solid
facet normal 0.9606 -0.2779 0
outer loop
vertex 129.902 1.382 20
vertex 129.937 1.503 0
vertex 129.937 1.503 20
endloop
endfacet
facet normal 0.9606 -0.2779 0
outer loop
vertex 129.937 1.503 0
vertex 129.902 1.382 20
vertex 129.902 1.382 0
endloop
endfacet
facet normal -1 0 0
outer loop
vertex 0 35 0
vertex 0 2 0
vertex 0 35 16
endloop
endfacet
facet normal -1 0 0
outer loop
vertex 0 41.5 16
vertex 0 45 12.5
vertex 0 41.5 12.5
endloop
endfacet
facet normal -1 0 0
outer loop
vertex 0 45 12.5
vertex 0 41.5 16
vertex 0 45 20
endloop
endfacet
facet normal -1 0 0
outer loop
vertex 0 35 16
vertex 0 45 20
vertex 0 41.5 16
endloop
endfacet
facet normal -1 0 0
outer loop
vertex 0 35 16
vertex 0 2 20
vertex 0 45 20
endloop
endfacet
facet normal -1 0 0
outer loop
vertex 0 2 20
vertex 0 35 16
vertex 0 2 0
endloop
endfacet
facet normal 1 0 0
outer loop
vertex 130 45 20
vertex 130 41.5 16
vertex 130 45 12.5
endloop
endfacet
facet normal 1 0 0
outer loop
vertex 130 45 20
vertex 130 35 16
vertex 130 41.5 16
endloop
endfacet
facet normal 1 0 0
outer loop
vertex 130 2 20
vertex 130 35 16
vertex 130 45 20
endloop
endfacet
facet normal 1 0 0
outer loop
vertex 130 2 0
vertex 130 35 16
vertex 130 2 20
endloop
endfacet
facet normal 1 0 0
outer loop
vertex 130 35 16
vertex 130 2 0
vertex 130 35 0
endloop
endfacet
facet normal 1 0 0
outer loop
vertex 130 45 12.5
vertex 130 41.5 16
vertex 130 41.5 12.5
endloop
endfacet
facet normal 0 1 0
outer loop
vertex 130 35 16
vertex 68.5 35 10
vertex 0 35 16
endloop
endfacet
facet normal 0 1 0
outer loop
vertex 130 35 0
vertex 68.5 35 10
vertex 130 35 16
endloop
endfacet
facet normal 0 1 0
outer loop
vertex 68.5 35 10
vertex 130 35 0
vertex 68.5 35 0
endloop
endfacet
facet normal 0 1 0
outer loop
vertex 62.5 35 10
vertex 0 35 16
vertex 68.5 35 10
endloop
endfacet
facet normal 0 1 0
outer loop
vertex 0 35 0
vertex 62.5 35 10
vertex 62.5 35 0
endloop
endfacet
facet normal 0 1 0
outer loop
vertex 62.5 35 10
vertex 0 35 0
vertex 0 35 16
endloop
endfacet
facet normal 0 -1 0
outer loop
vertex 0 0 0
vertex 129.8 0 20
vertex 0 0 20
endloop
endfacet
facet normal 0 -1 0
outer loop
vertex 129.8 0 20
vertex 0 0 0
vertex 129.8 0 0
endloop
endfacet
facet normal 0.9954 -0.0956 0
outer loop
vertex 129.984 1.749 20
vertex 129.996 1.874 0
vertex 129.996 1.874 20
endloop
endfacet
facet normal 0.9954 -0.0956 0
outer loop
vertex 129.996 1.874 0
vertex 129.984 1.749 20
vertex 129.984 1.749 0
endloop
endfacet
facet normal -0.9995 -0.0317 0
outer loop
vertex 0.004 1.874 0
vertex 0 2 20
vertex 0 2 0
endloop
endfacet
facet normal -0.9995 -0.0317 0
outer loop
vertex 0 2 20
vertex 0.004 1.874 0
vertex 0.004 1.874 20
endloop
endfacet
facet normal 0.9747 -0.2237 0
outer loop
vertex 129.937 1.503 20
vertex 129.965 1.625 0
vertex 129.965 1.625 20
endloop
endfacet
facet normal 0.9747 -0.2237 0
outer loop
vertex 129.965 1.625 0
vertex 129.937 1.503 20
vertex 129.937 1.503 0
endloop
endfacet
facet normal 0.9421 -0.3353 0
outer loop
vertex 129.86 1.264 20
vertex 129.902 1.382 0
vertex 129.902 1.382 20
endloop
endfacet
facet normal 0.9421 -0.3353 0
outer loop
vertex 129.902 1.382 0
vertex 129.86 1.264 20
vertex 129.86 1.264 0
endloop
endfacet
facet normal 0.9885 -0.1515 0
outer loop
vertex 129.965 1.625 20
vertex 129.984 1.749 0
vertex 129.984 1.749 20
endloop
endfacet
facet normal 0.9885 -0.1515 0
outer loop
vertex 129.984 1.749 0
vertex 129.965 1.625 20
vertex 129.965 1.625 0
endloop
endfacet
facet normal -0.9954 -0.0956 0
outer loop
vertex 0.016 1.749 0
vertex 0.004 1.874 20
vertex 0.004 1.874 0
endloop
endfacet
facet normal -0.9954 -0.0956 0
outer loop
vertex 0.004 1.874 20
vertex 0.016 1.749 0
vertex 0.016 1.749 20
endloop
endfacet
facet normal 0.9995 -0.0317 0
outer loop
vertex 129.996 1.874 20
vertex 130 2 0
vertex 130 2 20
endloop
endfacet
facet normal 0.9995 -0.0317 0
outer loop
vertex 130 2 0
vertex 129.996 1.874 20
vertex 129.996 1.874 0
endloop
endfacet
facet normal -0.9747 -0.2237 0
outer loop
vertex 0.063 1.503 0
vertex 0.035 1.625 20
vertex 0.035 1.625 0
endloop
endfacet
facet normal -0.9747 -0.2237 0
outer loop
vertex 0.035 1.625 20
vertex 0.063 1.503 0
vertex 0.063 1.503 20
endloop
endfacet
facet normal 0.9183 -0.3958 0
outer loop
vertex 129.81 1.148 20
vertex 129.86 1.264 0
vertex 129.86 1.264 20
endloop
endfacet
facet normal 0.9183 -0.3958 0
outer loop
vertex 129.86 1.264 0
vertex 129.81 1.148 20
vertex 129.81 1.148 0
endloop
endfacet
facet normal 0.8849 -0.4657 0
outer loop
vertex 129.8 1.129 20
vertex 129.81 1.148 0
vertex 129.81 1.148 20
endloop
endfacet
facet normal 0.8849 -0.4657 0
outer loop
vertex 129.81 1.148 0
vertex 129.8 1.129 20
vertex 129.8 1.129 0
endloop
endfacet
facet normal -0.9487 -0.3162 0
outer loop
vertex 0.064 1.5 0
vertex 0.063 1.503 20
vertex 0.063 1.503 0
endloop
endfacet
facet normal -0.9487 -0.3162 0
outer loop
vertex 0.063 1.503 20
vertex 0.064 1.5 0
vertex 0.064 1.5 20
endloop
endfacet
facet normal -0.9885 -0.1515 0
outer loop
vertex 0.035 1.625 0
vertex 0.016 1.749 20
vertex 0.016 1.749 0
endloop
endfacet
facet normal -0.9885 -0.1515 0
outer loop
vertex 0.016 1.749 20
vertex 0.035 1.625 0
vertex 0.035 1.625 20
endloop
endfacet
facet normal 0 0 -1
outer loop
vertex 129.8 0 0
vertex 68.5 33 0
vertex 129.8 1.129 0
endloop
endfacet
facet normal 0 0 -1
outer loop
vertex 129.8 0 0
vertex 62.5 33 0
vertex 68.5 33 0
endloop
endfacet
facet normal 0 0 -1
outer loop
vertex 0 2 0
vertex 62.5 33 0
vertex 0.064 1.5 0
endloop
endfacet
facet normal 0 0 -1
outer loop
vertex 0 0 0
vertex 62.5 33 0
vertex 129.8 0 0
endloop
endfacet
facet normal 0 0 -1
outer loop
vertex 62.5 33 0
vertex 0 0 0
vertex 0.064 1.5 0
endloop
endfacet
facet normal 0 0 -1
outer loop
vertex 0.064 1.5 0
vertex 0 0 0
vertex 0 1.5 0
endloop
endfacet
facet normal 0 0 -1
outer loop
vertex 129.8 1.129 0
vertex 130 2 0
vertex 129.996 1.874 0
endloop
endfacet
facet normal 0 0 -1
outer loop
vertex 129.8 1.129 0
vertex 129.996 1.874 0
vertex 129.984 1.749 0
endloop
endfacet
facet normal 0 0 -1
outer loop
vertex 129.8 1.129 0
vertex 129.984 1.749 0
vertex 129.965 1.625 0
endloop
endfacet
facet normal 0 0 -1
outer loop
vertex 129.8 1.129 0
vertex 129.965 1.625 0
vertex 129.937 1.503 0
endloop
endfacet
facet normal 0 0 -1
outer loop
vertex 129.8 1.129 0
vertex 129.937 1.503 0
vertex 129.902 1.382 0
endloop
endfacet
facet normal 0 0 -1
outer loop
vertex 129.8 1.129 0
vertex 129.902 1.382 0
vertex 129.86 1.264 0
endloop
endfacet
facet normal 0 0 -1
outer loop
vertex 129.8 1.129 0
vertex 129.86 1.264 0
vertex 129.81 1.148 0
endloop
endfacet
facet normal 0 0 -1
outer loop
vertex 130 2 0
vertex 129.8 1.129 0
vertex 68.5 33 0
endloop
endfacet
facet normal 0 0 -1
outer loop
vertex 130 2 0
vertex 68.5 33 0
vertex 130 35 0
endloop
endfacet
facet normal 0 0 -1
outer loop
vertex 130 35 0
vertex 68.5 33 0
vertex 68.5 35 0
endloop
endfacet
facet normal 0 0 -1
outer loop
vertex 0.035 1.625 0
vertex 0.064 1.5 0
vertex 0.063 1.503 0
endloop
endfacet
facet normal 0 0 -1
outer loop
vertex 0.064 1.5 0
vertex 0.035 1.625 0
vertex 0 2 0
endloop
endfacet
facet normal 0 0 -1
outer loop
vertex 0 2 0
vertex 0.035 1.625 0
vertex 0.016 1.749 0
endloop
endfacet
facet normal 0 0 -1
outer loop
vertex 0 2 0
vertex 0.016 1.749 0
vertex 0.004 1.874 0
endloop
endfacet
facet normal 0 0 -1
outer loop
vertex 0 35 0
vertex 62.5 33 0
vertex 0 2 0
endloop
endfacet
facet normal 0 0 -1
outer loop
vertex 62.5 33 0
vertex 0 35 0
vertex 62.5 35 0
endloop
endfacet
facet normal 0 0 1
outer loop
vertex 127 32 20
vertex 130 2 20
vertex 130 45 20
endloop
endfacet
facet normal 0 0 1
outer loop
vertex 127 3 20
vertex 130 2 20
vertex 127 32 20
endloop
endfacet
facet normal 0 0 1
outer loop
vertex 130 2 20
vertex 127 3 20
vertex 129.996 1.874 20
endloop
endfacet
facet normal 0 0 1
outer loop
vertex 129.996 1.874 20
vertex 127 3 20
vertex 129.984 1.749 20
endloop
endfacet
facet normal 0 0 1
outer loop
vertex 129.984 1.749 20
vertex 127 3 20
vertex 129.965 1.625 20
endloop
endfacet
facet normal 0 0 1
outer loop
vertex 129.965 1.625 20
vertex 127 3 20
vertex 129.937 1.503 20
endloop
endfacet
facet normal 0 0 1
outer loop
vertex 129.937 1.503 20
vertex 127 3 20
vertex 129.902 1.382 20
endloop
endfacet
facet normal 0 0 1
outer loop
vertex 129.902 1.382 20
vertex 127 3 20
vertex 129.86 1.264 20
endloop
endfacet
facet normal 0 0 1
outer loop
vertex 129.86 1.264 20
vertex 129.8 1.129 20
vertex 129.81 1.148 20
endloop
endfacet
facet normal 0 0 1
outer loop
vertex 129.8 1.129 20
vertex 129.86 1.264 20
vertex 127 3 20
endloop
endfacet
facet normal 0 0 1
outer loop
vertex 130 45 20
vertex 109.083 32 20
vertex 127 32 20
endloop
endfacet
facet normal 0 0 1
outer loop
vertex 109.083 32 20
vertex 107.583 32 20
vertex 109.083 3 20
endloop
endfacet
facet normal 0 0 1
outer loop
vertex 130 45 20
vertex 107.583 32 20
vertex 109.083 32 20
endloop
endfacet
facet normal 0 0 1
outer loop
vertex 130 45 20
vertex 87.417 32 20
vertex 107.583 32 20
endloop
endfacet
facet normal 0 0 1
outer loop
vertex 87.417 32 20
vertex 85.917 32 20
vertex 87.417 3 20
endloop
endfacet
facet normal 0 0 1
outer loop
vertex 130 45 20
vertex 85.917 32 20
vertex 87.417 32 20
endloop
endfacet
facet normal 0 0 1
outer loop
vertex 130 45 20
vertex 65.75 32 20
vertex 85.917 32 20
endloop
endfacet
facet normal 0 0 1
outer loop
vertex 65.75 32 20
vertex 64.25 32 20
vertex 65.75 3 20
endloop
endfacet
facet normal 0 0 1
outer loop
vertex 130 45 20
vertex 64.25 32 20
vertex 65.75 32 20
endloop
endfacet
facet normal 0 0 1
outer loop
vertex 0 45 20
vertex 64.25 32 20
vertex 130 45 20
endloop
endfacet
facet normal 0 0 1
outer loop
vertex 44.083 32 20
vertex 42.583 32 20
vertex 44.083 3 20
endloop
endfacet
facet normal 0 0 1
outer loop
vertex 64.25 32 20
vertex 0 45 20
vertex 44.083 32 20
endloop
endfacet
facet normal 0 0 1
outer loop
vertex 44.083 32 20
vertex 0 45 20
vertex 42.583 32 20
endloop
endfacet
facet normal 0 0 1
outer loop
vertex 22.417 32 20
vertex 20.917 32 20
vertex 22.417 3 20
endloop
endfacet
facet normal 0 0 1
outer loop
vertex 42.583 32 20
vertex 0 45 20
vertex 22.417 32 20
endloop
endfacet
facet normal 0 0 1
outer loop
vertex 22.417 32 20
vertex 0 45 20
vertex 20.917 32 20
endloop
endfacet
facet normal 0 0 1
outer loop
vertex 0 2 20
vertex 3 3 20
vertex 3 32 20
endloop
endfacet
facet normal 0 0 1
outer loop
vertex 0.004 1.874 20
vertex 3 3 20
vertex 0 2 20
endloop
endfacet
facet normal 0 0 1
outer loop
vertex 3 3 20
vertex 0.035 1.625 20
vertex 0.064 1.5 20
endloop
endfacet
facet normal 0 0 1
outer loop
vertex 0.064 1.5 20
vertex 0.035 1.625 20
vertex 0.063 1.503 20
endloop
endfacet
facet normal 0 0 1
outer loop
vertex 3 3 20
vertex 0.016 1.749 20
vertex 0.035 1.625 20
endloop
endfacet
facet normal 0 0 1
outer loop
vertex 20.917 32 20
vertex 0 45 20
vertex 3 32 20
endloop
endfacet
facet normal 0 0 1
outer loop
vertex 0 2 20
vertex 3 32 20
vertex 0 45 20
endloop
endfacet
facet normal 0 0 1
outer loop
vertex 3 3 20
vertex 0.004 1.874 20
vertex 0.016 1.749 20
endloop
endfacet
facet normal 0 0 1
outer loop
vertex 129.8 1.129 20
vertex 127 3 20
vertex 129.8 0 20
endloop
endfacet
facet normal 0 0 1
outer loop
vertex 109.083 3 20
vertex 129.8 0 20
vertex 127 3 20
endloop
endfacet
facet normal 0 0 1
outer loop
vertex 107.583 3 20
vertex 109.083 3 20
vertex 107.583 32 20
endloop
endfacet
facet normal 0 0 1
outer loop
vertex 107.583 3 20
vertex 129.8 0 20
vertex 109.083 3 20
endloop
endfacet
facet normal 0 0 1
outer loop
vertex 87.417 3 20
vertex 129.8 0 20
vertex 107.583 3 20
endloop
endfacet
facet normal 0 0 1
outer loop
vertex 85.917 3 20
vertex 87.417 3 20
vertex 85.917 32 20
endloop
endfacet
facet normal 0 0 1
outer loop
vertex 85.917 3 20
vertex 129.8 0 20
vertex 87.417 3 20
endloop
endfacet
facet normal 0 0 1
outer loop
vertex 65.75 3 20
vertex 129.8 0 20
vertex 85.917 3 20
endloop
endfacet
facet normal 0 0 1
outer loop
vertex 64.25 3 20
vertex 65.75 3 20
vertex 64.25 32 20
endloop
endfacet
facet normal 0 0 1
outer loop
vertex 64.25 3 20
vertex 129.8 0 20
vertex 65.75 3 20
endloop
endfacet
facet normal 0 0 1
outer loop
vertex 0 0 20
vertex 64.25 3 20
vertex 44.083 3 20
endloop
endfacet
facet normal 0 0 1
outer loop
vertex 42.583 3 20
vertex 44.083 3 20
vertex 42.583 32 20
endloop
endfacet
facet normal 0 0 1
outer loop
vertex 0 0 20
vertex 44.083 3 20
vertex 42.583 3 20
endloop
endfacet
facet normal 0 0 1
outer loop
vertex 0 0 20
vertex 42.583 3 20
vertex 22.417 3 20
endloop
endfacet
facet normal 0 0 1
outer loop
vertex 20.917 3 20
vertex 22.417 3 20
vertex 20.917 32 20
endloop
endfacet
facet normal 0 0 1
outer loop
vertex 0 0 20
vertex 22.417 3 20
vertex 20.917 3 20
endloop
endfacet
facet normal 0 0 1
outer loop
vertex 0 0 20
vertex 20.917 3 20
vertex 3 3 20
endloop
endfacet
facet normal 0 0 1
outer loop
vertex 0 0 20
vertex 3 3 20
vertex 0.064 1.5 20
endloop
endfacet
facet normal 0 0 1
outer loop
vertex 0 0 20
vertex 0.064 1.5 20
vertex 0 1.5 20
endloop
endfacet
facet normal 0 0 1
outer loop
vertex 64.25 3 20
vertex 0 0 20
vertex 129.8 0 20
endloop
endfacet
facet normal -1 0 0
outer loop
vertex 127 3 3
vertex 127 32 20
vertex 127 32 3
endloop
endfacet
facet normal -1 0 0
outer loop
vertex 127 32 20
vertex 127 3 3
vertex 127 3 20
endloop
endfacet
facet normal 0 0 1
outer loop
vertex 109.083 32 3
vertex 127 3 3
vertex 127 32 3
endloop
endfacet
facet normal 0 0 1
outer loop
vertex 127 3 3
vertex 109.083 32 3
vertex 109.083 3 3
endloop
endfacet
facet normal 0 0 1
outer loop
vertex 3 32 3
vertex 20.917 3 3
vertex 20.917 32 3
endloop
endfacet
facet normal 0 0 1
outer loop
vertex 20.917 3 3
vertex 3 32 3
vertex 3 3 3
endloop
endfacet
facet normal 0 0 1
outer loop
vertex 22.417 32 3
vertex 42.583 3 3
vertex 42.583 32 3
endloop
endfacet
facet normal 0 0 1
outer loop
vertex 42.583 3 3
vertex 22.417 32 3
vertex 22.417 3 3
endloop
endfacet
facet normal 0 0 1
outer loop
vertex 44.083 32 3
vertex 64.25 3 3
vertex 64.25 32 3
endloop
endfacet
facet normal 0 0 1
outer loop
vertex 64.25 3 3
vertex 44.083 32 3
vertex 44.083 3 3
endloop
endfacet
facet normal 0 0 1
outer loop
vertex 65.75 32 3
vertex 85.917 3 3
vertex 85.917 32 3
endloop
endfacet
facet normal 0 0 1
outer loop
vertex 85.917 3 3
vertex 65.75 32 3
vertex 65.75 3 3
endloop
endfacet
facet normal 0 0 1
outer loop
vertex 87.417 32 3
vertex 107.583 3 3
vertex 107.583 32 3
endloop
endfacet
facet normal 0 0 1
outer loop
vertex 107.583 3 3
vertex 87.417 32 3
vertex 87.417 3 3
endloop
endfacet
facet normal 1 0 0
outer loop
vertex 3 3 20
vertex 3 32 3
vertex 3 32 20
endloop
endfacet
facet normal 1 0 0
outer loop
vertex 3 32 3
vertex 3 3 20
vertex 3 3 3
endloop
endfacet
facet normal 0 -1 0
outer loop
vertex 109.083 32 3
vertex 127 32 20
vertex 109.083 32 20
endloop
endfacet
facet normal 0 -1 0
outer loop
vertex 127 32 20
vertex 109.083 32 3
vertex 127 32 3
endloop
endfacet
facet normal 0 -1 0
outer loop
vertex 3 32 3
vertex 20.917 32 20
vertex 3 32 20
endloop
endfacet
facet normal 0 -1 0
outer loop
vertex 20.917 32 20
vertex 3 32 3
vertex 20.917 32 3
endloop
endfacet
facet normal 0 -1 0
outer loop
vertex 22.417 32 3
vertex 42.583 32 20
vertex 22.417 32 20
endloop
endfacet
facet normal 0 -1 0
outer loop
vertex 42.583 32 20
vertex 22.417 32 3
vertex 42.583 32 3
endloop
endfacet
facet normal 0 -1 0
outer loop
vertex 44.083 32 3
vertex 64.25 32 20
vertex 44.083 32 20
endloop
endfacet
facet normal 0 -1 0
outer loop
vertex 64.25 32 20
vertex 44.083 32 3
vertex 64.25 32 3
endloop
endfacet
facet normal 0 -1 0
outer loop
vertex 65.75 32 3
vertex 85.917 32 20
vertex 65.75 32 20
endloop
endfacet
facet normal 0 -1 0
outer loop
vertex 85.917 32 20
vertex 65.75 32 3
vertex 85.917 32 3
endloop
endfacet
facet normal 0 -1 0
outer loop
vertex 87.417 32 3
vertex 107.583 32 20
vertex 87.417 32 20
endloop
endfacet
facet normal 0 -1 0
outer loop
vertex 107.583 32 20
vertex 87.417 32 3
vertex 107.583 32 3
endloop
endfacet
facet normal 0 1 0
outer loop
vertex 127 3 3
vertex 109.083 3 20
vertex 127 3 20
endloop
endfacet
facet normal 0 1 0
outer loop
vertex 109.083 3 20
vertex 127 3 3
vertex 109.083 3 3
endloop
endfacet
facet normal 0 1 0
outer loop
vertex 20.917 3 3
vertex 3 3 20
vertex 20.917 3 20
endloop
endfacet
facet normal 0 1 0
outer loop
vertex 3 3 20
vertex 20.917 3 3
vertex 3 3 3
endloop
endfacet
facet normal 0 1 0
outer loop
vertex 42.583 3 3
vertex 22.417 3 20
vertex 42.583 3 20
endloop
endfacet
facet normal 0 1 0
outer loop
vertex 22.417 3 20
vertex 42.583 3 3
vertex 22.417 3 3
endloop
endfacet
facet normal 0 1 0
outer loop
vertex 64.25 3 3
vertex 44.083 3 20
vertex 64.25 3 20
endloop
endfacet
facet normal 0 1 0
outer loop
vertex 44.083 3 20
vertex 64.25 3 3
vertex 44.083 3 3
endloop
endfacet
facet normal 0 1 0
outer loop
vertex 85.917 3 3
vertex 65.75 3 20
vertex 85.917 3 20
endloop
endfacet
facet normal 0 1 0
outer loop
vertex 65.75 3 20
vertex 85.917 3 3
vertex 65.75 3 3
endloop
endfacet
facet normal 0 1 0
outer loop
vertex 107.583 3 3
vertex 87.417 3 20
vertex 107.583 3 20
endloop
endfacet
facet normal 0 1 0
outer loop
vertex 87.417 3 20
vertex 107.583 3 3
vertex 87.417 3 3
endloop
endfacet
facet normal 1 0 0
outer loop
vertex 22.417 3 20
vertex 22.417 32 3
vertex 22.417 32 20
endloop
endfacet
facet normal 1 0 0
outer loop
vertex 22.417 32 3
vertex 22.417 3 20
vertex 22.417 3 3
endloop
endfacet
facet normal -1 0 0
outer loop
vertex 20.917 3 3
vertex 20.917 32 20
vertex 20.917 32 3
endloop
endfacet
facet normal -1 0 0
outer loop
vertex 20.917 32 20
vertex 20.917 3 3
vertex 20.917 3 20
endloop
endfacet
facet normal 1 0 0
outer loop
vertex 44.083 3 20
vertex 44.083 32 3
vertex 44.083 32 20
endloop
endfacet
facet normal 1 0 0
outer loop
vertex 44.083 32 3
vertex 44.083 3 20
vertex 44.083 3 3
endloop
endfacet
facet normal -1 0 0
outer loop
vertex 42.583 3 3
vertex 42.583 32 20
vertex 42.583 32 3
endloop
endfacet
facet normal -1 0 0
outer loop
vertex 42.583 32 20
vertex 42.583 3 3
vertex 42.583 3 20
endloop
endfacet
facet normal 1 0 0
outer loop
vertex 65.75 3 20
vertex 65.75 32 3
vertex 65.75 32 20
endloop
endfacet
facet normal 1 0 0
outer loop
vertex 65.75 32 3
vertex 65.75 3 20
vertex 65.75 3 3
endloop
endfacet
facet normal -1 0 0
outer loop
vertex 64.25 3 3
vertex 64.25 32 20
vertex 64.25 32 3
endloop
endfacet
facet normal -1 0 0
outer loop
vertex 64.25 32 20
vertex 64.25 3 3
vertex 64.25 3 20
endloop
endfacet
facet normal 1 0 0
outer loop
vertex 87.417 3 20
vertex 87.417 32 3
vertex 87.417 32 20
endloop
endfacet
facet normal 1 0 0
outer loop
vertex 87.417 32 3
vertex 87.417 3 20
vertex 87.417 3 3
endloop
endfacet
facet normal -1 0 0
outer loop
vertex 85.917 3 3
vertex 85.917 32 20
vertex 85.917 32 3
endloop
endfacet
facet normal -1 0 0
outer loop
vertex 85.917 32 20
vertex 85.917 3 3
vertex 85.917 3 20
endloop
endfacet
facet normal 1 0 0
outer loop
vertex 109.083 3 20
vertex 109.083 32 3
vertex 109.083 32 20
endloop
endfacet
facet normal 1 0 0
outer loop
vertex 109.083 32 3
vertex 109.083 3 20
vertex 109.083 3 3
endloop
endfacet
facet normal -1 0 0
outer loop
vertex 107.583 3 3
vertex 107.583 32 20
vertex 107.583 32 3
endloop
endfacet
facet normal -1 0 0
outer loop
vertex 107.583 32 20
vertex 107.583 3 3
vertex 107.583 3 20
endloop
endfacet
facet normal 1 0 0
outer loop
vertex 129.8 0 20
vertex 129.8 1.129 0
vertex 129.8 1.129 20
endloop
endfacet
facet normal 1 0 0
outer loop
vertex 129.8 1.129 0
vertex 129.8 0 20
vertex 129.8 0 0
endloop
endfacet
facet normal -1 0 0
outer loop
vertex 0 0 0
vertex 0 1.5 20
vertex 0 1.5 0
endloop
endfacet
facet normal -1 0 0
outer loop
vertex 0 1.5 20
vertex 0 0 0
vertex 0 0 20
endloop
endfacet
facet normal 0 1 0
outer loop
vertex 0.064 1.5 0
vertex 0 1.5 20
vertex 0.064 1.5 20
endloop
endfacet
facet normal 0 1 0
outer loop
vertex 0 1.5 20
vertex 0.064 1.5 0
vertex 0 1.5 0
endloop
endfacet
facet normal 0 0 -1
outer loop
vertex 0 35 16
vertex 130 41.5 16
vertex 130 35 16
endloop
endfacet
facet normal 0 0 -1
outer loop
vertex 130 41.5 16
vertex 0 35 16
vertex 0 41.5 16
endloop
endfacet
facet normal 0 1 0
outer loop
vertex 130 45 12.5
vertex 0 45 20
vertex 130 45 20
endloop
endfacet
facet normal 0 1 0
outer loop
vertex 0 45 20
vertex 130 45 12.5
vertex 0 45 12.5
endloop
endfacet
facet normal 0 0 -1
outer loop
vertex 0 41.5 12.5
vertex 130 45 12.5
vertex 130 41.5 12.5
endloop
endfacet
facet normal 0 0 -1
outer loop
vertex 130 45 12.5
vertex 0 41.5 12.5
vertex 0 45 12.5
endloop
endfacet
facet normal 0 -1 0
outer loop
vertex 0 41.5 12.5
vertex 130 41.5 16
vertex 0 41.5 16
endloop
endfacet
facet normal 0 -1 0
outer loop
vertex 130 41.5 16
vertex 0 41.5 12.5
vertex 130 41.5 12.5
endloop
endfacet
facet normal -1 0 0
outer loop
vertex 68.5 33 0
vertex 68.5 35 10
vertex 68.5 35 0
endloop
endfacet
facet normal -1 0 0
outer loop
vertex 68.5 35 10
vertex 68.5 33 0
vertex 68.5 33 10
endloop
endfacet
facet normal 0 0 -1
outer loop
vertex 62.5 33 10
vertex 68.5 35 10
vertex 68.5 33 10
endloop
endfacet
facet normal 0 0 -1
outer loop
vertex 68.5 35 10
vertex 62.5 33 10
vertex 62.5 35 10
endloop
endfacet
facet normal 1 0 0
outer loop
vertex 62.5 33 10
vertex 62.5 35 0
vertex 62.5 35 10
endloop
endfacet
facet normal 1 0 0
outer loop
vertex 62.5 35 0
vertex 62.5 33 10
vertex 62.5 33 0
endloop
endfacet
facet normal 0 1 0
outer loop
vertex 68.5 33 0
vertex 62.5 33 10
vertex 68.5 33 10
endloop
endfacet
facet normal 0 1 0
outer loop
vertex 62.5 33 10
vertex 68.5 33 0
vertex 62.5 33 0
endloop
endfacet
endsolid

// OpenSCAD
$fn = 100;

// Length of the tool box.
l = 130;

// Width of the tool box (mm)
w = 35;

// Height of the tool box (mm)
h = 20;

// Outer wall thickness
owall = 3;

// Inner wall thickness
iwall = 1.5;

// Number of compartments in x direction
ncx = 6;

// Number of compartments in y direction
ncy = 0;

// Outer edge radius.
rounding = 2;

delta = 0.1;

module box() {
    difference() {
        hull() {
            translate([rounding, rounding, 0])
                cylinder(h=h, r=rounding);
            translate([l-rounding, rounding, 0])
                cylinder(h=h, r=rounding);
            translate([l-2*rounding, w-2*rounding, 0])
                cube([2*rounding, 2*rounding, h]);
            translate([0, w-2*rounding, 0])
                cube([2*rounding, 2*rounding, h]);
        }
        translate([owall, owall, owall])
            cube([l-2*owall, w-2*owall, h]);
    }
    translate([0, w, h-4]) cube([l, 10, 4]);
    translate([0, w+6.5, h-4-3.5]) cube([l, 3.5, 3.5]);
    for (i = [1 : ncx-1])
        translate([l*i/ncx-iwall/2, delta, 0])
            cube([iwall, w-2*delta, h]);
    for (i = [1 : ncy-1])
        translate([delta, w*i/ncy-iwall/2, 0])
            cube([l-2*delta, iwall, h]);
}

difference() {
    box();
    // There's a screw in the way on the ultimaker. Make space for it.
    translate([l/2-2.5,w-2,h-4-6-15]) cube([6,2+delta,15]);
}
